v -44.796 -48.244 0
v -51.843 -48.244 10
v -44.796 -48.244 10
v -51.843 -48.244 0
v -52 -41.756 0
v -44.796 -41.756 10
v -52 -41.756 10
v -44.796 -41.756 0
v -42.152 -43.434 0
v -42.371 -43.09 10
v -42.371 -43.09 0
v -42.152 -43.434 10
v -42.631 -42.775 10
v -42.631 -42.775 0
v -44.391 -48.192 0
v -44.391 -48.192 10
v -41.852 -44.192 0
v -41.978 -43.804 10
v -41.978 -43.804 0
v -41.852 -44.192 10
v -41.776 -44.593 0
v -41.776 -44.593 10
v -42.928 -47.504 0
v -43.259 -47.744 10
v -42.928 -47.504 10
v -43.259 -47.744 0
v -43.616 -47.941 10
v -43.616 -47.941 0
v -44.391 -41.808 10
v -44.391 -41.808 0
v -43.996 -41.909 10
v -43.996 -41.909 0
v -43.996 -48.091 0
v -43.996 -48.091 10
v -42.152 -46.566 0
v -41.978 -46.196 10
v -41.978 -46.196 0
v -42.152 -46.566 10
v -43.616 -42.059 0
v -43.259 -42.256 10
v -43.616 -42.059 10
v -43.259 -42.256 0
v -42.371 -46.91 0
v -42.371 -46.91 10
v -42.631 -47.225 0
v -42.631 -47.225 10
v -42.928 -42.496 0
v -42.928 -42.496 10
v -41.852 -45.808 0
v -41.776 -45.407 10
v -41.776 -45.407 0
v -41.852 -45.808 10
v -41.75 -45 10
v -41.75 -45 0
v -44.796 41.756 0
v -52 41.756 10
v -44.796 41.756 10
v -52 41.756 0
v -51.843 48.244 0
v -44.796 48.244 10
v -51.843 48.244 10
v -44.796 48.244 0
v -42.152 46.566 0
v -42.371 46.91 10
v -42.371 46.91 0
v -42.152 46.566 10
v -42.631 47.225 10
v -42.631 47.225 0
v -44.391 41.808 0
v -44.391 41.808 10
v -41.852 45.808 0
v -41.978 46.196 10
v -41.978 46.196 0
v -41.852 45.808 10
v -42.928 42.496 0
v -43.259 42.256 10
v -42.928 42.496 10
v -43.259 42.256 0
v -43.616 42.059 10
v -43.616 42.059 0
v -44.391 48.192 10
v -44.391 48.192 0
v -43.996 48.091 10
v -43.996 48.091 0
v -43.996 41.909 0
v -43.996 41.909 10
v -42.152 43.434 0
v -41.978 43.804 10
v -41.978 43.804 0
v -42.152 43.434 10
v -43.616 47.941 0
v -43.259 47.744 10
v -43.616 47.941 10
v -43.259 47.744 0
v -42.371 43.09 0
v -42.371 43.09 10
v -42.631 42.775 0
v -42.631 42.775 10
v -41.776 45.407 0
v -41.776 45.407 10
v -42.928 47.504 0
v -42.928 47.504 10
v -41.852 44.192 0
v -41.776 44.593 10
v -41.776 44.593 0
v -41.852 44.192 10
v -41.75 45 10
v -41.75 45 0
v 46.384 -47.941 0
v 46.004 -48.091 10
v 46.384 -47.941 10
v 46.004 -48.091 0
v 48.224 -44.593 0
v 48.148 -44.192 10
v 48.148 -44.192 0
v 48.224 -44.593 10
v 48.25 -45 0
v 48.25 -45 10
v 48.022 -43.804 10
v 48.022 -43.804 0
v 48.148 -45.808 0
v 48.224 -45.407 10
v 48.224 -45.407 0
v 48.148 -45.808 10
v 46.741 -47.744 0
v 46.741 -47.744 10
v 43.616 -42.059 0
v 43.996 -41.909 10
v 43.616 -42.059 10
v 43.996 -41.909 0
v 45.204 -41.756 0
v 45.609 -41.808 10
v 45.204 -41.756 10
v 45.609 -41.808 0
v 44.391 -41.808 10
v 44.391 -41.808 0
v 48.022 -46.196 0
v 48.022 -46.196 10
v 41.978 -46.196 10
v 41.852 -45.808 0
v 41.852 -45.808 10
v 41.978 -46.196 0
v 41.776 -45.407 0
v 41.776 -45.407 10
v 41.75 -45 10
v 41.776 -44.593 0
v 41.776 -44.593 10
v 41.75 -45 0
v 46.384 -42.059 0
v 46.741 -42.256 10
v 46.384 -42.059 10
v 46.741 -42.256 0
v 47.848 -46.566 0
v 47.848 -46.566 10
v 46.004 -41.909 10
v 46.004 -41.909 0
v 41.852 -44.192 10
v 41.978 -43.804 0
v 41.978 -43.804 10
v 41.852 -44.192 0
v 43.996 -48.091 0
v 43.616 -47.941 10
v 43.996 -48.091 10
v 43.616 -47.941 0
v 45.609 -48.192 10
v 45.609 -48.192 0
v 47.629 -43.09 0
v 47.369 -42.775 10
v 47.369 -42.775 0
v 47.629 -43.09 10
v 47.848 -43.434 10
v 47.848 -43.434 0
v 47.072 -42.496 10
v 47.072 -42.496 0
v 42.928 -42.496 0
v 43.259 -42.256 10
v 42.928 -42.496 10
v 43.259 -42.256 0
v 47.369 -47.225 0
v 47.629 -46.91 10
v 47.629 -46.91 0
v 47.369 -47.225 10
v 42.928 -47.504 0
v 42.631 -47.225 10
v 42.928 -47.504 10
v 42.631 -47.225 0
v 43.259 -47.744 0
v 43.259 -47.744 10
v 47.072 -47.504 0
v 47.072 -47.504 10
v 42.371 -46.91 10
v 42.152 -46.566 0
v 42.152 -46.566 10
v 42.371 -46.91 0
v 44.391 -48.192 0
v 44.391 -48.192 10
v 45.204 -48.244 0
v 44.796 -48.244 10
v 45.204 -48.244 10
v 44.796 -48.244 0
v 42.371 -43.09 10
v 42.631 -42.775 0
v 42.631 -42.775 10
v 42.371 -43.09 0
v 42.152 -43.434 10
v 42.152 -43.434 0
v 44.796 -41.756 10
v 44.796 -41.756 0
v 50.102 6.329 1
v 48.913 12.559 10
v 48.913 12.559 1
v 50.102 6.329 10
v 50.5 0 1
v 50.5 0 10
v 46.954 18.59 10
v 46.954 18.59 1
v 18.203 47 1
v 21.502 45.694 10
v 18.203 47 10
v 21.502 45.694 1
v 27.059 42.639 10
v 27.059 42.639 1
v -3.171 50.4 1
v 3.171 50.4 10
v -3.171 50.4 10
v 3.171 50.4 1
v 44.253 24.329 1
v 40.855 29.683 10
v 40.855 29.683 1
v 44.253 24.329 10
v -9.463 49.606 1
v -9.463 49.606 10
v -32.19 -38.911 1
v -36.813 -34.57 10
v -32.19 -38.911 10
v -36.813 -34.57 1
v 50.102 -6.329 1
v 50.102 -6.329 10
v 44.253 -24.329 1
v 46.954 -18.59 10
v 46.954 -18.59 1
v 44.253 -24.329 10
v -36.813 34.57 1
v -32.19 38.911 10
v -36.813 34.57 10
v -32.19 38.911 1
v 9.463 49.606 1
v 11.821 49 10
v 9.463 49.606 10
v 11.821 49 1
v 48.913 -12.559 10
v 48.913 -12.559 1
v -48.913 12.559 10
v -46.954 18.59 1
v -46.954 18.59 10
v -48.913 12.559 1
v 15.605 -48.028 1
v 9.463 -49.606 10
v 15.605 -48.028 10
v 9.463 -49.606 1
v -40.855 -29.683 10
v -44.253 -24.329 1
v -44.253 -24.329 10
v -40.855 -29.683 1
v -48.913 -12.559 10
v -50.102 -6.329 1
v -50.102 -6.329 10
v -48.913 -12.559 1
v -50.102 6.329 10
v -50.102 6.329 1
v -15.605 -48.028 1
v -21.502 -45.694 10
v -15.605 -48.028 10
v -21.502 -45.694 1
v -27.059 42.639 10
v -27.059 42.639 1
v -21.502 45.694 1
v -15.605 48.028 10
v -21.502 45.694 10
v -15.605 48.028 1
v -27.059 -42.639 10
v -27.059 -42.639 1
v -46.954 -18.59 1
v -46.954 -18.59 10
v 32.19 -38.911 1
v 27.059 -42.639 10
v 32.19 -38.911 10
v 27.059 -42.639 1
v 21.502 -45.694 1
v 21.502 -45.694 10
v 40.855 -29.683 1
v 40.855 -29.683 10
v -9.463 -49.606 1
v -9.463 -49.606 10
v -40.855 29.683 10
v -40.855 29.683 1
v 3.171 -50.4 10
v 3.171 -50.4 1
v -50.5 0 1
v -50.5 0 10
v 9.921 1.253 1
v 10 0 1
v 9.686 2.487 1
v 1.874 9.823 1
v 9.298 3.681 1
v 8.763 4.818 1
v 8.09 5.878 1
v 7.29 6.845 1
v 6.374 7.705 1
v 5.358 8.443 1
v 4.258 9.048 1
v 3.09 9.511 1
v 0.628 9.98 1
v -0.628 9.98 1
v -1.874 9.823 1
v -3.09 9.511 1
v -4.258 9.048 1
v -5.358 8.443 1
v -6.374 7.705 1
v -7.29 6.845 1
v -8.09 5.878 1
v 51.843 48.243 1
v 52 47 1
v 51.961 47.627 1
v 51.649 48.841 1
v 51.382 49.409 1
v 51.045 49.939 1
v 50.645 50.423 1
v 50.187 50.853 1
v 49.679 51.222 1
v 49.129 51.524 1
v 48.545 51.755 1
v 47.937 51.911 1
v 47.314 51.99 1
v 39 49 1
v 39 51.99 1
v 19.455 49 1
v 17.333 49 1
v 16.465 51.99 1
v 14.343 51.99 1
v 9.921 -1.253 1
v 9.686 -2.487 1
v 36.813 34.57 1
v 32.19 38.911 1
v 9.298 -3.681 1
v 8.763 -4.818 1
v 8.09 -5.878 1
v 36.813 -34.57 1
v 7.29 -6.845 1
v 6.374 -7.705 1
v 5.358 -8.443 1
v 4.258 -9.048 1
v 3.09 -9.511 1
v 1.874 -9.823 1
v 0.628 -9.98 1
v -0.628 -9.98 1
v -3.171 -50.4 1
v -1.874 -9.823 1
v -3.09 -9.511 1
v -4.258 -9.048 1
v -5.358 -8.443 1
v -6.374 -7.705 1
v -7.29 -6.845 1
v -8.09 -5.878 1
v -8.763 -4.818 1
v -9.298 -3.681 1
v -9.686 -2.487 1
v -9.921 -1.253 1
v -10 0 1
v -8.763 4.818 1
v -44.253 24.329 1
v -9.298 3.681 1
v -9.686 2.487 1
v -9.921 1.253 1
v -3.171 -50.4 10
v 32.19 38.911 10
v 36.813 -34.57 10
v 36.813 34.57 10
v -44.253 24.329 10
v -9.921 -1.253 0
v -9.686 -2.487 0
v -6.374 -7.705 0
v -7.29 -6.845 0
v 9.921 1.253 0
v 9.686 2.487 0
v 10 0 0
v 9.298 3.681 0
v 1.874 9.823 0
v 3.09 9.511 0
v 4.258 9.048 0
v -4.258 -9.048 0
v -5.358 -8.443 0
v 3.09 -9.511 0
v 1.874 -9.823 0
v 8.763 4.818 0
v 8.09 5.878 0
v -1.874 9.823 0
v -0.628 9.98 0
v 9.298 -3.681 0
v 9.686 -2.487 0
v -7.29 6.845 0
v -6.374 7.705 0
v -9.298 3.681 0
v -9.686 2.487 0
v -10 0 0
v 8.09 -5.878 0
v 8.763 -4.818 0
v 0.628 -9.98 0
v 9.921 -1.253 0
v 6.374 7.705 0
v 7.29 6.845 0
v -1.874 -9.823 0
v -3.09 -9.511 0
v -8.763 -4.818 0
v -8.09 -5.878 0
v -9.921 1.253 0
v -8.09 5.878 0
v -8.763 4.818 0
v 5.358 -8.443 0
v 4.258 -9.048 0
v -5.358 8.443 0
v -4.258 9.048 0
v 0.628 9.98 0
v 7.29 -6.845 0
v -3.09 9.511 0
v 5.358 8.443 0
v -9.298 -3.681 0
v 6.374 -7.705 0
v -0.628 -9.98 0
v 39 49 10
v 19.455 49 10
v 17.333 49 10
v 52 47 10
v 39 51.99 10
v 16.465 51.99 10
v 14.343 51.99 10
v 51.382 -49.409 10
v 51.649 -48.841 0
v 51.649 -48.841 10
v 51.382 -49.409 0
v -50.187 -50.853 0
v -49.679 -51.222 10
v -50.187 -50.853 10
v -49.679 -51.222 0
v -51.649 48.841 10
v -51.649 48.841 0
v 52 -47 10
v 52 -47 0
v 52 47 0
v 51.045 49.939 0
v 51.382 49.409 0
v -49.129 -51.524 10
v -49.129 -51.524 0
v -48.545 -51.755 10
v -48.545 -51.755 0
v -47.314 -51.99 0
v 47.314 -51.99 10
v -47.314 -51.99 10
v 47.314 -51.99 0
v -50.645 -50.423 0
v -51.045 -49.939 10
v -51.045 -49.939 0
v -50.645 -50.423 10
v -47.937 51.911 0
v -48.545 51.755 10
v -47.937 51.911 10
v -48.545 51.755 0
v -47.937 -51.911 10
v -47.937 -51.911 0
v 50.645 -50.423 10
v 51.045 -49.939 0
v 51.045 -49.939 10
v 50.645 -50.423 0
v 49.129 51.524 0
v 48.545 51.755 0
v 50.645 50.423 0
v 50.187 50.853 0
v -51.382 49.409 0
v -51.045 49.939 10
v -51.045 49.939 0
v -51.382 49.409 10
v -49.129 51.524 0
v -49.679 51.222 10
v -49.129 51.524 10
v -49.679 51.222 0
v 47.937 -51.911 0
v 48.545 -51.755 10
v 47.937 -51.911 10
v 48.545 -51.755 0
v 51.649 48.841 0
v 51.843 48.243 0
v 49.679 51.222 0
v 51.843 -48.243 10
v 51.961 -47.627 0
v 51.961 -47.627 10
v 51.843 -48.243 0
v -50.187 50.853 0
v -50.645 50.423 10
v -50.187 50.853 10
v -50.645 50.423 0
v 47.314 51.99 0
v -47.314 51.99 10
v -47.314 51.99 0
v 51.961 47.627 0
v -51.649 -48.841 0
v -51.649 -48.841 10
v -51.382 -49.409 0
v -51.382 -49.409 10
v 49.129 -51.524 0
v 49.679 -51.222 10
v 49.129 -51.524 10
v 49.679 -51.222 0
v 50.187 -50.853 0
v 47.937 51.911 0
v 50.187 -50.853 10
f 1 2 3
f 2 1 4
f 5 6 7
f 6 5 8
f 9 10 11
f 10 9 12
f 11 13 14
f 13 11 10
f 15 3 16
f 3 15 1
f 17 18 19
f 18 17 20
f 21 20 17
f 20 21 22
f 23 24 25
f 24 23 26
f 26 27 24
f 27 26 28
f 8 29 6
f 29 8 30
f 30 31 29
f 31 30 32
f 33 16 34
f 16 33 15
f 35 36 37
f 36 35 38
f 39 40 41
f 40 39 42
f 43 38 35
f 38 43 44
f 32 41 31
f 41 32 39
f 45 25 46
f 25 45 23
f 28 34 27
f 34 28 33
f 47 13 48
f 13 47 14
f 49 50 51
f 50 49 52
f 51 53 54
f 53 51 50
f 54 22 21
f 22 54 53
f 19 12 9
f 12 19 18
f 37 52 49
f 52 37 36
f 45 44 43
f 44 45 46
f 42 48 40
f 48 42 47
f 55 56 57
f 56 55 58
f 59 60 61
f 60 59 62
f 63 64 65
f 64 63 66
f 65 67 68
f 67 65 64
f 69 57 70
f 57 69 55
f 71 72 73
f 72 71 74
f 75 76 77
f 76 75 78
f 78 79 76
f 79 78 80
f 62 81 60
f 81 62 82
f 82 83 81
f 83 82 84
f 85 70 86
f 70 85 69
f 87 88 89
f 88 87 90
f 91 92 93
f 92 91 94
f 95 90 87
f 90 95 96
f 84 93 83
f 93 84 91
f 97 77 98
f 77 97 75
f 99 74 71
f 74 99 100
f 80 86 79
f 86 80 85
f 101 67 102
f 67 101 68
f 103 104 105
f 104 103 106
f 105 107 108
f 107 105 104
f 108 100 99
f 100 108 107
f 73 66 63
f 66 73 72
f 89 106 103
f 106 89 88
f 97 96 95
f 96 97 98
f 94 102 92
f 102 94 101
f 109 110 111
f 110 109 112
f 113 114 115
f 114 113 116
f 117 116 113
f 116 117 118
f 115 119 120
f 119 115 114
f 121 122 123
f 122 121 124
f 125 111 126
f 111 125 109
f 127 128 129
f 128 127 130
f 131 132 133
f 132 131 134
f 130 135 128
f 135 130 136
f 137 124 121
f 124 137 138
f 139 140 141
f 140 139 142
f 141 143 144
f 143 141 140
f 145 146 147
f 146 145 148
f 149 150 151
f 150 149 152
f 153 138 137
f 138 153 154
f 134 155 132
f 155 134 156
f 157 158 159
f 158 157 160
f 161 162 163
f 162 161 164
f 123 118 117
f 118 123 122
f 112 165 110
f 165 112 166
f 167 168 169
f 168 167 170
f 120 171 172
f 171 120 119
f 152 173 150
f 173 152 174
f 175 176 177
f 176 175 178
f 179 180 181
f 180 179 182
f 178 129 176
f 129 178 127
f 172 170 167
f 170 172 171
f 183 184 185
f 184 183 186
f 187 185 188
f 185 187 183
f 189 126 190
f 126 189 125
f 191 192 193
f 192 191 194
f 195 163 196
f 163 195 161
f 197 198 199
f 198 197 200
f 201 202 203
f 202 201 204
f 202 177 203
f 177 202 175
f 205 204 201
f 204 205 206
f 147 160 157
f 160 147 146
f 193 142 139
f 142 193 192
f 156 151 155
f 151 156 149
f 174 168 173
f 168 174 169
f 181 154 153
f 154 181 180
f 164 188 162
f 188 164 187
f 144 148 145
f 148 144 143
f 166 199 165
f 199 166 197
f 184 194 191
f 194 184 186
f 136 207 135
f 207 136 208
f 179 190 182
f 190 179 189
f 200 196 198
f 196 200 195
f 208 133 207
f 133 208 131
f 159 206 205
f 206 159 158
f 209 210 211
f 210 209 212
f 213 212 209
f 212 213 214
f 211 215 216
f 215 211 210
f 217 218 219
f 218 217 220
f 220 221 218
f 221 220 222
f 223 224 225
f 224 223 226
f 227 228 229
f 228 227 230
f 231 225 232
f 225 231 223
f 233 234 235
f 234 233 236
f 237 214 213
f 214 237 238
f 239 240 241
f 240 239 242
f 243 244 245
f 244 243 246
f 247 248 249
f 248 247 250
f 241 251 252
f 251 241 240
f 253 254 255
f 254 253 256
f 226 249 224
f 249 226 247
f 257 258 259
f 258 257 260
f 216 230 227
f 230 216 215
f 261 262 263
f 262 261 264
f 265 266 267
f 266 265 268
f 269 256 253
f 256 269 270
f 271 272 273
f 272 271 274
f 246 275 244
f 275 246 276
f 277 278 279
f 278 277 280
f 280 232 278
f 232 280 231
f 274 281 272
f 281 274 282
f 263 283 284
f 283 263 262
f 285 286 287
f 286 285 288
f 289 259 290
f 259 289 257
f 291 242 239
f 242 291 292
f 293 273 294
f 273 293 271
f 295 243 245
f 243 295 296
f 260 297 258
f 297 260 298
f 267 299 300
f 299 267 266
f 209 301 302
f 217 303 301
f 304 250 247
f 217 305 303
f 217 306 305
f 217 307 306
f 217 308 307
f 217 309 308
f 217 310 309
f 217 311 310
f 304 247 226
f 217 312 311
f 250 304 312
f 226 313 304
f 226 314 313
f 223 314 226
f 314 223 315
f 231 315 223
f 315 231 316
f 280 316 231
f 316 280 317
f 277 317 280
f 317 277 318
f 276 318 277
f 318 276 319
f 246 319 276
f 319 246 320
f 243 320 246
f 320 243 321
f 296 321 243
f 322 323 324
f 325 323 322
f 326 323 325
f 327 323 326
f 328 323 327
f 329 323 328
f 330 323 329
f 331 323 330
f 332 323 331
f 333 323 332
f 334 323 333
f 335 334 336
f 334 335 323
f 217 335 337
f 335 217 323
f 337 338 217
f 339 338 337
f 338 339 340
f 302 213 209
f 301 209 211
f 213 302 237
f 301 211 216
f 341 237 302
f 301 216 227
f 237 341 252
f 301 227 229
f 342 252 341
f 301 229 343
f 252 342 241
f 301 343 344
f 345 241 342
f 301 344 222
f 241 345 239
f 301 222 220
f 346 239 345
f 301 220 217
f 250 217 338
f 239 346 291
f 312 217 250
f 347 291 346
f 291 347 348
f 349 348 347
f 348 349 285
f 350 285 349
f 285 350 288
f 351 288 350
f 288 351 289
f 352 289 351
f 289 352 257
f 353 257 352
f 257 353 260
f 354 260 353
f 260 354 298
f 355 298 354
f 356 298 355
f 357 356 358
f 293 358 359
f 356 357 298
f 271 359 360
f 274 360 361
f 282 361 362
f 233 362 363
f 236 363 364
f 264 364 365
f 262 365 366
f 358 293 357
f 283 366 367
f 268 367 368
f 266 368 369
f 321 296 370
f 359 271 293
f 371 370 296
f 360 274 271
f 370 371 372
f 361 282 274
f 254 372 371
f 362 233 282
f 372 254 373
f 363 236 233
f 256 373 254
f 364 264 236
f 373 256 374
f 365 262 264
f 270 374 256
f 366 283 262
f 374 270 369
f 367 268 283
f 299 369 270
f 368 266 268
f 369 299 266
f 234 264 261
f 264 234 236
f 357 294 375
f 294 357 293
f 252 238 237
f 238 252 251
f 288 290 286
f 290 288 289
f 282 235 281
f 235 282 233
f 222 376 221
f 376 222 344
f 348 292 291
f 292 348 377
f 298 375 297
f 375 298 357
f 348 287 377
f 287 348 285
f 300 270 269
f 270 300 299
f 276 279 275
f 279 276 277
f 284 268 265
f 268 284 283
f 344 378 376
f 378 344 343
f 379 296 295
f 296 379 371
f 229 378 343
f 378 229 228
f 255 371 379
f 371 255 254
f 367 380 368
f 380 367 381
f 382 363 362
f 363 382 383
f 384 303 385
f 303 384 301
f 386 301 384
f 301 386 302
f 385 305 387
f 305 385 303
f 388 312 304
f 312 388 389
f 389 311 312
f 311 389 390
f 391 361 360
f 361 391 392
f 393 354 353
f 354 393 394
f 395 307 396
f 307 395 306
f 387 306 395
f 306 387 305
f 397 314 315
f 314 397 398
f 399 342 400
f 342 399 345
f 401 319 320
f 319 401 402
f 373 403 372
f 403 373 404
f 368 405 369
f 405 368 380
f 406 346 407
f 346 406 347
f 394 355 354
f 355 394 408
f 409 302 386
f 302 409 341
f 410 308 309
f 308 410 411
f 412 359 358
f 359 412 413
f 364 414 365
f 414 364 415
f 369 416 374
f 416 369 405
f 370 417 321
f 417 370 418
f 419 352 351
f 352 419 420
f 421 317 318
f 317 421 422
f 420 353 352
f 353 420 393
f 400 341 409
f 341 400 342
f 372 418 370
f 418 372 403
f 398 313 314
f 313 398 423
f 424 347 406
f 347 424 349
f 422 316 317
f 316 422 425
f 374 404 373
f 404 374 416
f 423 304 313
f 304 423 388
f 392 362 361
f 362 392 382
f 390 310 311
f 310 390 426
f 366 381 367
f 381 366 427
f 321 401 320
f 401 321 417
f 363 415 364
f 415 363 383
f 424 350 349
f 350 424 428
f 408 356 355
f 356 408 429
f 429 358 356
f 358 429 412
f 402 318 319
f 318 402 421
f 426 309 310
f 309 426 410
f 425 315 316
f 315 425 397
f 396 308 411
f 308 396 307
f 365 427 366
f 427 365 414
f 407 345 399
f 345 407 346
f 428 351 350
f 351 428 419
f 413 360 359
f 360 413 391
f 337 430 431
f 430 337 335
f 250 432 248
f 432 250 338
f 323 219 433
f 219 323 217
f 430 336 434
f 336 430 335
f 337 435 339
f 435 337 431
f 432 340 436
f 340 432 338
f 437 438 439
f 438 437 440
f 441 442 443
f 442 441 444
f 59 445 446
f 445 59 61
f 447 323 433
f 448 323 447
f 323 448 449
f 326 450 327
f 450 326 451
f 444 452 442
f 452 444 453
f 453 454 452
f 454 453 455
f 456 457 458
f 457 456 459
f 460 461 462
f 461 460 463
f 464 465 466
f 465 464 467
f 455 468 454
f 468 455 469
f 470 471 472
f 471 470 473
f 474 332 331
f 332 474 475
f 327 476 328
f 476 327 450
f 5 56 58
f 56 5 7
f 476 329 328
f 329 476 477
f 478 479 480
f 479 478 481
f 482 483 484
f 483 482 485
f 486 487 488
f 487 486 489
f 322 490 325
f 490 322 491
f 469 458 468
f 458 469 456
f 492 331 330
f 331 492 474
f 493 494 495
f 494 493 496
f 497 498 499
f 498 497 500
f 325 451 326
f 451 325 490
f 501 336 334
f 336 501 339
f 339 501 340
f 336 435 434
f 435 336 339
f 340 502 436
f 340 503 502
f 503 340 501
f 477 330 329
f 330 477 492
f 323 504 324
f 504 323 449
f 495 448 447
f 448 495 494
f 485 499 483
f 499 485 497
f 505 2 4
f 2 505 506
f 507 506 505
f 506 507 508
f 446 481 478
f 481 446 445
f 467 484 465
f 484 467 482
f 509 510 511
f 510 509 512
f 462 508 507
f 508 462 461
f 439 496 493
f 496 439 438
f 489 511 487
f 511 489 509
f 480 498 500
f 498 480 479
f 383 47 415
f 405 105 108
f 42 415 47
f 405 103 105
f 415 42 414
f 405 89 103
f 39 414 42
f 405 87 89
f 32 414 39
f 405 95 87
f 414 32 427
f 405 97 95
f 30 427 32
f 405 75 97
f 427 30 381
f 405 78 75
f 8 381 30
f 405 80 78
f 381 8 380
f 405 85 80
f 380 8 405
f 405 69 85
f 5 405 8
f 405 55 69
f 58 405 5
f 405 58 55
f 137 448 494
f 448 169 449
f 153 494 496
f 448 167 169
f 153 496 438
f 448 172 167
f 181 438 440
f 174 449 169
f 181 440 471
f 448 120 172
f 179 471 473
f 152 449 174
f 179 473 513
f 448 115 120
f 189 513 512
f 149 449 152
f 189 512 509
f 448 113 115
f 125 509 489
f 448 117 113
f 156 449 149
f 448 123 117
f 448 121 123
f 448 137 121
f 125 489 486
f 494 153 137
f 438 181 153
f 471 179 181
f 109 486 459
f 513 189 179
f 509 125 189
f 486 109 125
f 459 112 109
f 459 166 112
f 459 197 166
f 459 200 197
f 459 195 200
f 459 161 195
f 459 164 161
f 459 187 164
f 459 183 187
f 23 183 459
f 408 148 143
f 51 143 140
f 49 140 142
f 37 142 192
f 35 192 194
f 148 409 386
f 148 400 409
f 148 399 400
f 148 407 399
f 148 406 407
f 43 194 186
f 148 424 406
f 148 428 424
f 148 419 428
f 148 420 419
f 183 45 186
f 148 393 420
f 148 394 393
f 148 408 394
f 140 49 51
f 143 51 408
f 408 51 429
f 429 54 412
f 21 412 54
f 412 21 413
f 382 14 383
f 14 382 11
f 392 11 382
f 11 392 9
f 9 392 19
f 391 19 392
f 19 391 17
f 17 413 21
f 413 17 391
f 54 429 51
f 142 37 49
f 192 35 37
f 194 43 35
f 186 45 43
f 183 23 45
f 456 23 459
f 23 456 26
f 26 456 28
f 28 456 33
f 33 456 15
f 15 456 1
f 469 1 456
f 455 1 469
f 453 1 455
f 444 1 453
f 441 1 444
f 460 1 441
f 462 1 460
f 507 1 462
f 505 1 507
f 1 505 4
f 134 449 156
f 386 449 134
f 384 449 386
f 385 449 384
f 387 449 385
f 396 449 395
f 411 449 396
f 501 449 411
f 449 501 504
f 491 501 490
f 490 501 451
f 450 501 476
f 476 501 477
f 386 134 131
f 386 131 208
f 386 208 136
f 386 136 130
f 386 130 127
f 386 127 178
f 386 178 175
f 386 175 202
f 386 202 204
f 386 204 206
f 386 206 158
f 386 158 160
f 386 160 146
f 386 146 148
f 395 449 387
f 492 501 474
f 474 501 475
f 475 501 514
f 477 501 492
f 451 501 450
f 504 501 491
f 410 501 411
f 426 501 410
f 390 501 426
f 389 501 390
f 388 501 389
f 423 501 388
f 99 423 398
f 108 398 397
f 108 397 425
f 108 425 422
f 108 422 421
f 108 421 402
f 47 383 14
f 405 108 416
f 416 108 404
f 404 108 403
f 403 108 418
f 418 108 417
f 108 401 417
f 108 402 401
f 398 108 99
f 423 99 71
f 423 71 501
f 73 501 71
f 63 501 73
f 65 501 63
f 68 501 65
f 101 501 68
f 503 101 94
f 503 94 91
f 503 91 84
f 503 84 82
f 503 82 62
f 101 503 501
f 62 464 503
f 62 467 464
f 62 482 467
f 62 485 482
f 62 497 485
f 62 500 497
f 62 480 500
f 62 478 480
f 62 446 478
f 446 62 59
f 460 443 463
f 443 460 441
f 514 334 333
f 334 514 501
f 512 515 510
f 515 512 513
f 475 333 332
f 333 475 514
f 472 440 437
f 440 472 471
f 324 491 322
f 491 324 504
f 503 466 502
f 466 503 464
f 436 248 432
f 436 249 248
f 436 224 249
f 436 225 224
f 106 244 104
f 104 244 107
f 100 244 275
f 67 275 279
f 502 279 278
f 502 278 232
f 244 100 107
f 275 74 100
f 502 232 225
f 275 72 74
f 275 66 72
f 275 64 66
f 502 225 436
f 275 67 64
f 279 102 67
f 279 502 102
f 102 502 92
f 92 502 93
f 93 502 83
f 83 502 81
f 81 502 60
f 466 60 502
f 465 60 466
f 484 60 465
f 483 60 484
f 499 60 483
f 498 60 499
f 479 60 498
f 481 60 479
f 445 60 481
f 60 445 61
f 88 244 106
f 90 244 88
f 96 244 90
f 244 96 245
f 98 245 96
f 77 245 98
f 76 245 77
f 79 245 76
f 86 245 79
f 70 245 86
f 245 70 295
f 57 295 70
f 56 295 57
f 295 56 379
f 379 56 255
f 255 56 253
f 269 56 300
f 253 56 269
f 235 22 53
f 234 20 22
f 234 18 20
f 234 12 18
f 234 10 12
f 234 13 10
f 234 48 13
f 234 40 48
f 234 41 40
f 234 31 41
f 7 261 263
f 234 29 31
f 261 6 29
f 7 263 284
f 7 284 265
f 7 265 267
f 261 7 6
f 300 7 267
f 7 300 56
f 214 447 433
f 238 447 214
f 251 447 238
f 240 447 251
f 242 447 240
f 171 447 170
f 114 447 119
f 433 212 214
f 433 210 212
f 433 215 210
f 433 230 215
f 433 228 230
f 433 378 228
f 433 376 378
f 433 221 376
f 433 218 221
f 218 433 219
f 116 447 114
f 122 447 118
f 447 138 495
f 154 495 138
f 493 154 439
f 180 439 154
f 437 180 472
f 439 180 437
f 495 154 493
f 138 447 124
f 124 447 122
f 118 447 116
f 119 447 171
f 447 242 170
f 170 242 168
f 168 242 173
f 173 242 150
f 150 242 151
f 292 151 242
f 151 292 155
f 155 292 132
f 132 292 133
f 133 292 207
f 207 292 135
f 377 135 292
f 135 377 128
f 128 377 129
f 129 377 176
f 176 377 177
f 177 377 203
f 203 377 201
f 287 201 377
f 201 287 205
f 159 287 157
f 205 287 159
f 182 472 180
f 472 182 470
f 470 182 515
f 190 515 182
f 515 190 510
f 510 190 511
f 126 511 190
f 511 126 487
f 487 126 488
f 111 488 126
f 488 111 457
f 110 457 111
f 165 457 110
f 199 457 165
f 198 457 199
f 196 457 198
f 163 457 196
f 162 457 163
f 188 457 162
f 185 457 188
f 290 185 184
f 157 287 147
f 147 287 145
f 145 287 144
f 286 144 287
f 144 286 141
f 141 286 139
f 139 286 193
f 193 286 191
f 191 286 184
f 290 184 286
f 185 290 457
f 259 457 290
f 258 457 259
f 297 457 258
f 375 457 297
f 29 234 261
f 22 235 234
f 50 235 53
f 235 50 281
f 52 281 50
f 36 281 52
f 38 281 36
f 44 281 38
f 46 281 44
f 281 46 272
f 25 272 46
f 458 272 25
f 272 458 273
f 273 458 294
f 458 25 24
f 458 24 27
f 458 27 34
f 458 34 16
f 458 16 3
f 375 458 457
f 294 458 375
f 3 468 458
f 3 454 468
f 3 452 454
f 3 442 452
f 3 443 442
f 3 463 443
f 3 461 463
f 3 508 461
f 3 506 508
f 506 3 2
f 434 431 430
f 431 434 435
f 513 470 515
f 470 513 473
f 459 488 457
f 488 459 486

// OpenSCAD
$fn = 50;


difference() {
	union() {
		translate(v = [0, 0, 0]) {
			rotate(a = [0, 0, 0]) {
				hull() {
					translate(v = [-47.0000000000, 47.0000000000, 0]) {
						rotate(a = [0, 0, 0]) {
							translate(v = [0, 0, 0]) {
								rotate(a = [0, 0, 0]) {
									cylinder(h = 10, r = 5);
								}
							}
						}
					}
					translate(v = [47.0000000000, 47.0000000000, 0]) {
						rotate(a = [0, 0, 0]) {
							translate(v = [0, 0, 0]) {
								rotate(a = [0, 0, 0]) {
									cylinder(h = 10, r = 5);
								}
							}
						}
					}
					translate(v = [-47.0000000000, -47.0000000000, 0]) {
						rotate(a = [0, 0, 0]) {
							translate(v = [0, 0, 0]) {
								rotate(a = [0, 0, 0]) {
									cylinder(h = 10, r = 5);
								}
							}
						}
					}
					translate(v = [47.0000000000, -47.0000000000, 0]) {
						rotate(a = [0, 0, 0]) {
							translate(v = [0, 0, 0]) {
								rotate(a = [0, 0, 0]) {
									cylinder(h = 10, r = 5);
								}
							}
						}
					}
				}
			}
		}
	}
	union() {
		translate(v = [-52.5000000000, -45.0000000000, -125]) {
			rotate(a = [0, 0, 0]) {
				hull() {
					translate(v = [7.5000000000, 0, 0]) {
						rotate(a = [0, 0, 0]) {
							translate(v = [0, 0, 0]) {
								rotate(a = [0, 0, 0]) {
									cylinder(h = 250, r = 3.2500000000);
								}
							}
						}
					}
					translate(v = [-7.5000000000, 0, 0]) {
						rotate(a = [0, 0, 0]) {
							translate(v = [0, 0, 0]) {
								rotate(a = [0, 0, 0]) {
									cylinder(h = 250, r = 3.2500000000);
								}
							}
						}
					}
				}
			}
		}
		translate(v = [-52.5000000000, 45.0000000000, -125]) {
			rotate(a = [0, 0, 0]) {
				hull() {
					translate(v = [7.5000000000, 0, 0]) {
						rotate(a = [0, 0, 0]) {
							translate(v = [0, 0, 0]) {
								rotate(a = [0, 0, 0]) {
									cylinder(h = 250, r = 3.2500000000);
								}
							}
						}
					}
					translate(v = [-7.5000000000, 0, 0]) {
						rotate(a = [0, 0, 0]) {
							translate(v = [0, 0, 0]) {
								rotate(a = [0, 0, 0]) {
									cylinder(h = 250, r = 3.2500000000);
								}
							}
						}
					}
				}
			}
		}
		translate(v = [45.0000000000, -45.0000000000, -125.0000000000]) {
			rotate(a = [0, 0, 0]) {
				cylinder(h = 250, r = 3.2500000000);
			}
		}
		translate(v = [0, 0, 1.0000000000]) {
			rotate(a = [0, 0, 0]) {
				cylinder(h = 12, r = 50.5000000000);
			}
		}
		translate(v = [0, 0, -5.0000000000]) {
			rotate(a = [0, 0, 0]) {
				cylinder(h = 10, r = 10.0000000000);
			}
		}
		translate(v = [0.0000000000, 47.0000000000, 1]) {
			rotate(a = [0, 0, 0]) {
				cube(size = [52.0000000000, 2, 12]);
			}
		}
		translate(v = [39.0000000000, 47.0000000000, 1]) {
			rotate(a = [0, 0, 0]) {
				cube(size = [13.0000000000, 5, 12]);
			}
		}
		translate(v = [13.5833333333, 52.7500000000, 1]) {
			rotate(a = [0, 0, -45]) {
				cube(size = [7.5000000000, 1.5000000000, 12]);
			}
		}
	}
}
